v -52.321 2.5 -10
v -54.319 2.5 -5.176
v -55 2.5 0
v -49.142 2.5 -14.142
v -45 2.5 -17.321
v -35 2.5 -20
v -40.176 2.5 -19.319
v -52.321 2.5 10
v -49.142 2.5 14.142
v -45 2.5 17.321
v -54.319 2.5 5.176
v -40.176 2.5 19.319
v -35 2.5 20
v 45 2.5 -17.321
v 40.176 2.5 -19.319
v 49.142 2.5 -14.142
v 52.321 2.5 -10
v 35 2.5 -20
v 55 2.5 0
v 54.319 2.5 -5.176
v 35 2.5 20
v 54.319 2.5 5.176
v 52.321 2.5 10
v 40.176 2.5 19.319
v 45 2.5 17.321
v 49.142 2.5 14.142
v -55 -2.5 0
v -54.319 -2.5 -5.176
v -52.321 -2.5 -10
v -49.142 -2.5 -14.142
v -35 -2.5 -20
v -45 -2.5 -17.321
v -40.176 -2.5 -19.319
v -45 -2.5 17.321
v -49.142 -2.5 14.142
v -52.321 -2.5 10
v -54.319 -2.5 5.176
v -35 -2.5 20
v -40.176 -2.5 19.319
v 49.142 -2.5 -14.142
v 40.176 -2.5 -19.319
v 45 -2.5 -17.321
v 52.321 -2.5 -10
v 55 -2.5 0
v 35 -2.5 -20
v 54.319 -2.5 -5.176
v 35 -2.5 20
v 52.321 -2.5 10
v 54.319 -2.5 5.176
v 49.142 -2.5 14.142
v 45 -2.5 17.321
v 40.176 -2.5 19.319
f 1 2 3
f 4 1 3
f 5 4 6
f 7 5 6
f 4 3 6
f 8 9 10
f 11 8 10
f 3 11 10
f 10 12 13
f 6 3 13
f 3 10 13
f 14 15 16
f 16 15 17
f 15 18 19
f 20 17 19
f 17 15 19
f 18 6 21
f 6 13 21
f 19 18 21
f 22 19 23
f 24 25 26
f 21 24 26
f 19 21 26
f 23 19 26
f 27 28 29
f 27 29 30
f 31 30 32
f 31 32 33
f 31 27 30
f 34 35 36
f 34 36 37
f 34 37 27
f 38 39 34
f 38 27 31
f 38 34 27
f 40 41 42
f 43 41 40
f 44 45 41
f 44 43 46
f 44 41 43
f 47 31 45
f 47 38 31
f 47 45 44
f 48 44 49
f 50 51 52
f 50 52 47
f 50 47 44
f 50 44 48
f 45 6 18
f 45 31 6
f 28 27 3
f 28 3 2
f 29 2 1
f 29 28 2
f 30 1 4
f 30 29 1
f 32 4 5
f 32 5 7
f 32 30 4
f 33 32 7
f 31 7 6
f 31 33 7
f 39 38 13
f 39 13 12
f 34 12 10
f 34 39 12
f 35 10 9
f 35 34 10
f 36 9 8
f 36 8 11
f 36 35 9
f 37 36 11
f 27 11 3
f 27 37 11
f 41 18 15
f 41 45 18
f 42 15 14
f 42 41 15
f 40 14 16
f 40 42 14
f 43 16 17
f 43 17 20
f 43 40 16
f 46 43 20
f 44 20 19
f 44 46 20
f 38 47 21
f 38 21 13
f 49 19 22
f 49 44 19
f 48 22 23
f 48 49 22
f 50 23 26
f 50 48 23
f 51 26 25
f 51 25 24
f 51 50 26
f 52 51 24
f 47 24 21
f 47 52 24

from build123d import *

# Parameters (mm, degrees)
F0_R     = 12.5
F1_DEPTH = 2.5


with BuildPart() as f1:
    # F0 (on Front) → F1 (new body, symmetric)
    with BuildSketch(Plane.XZ):
        with BuildLine():
            ThreePointArc((55, 0), (49.142136, 14.142136), (35, 20))
            Line((35, 20), (-35, 20))
            ThreePointArc((-35, 20), (-49.142136, 14.142136), (-55, 0))
            ThreePointArc((-55, 0), (-49.142136, -14.142136), (-35, -20))
            Line((-35, -20), (35, -20))
            ThreePointArc((35, -20), (49.142136, -14.142136), (55, 0))
        make_face()
        with Locations((35, 0)):
            Circle(F0_R, mode=Mode.SUBTRACT)
        with Locations((35, 0)):
            Circle(F0_R)
    extrude(amount=F1_DEPTH, both=True)


solid = f1.part
